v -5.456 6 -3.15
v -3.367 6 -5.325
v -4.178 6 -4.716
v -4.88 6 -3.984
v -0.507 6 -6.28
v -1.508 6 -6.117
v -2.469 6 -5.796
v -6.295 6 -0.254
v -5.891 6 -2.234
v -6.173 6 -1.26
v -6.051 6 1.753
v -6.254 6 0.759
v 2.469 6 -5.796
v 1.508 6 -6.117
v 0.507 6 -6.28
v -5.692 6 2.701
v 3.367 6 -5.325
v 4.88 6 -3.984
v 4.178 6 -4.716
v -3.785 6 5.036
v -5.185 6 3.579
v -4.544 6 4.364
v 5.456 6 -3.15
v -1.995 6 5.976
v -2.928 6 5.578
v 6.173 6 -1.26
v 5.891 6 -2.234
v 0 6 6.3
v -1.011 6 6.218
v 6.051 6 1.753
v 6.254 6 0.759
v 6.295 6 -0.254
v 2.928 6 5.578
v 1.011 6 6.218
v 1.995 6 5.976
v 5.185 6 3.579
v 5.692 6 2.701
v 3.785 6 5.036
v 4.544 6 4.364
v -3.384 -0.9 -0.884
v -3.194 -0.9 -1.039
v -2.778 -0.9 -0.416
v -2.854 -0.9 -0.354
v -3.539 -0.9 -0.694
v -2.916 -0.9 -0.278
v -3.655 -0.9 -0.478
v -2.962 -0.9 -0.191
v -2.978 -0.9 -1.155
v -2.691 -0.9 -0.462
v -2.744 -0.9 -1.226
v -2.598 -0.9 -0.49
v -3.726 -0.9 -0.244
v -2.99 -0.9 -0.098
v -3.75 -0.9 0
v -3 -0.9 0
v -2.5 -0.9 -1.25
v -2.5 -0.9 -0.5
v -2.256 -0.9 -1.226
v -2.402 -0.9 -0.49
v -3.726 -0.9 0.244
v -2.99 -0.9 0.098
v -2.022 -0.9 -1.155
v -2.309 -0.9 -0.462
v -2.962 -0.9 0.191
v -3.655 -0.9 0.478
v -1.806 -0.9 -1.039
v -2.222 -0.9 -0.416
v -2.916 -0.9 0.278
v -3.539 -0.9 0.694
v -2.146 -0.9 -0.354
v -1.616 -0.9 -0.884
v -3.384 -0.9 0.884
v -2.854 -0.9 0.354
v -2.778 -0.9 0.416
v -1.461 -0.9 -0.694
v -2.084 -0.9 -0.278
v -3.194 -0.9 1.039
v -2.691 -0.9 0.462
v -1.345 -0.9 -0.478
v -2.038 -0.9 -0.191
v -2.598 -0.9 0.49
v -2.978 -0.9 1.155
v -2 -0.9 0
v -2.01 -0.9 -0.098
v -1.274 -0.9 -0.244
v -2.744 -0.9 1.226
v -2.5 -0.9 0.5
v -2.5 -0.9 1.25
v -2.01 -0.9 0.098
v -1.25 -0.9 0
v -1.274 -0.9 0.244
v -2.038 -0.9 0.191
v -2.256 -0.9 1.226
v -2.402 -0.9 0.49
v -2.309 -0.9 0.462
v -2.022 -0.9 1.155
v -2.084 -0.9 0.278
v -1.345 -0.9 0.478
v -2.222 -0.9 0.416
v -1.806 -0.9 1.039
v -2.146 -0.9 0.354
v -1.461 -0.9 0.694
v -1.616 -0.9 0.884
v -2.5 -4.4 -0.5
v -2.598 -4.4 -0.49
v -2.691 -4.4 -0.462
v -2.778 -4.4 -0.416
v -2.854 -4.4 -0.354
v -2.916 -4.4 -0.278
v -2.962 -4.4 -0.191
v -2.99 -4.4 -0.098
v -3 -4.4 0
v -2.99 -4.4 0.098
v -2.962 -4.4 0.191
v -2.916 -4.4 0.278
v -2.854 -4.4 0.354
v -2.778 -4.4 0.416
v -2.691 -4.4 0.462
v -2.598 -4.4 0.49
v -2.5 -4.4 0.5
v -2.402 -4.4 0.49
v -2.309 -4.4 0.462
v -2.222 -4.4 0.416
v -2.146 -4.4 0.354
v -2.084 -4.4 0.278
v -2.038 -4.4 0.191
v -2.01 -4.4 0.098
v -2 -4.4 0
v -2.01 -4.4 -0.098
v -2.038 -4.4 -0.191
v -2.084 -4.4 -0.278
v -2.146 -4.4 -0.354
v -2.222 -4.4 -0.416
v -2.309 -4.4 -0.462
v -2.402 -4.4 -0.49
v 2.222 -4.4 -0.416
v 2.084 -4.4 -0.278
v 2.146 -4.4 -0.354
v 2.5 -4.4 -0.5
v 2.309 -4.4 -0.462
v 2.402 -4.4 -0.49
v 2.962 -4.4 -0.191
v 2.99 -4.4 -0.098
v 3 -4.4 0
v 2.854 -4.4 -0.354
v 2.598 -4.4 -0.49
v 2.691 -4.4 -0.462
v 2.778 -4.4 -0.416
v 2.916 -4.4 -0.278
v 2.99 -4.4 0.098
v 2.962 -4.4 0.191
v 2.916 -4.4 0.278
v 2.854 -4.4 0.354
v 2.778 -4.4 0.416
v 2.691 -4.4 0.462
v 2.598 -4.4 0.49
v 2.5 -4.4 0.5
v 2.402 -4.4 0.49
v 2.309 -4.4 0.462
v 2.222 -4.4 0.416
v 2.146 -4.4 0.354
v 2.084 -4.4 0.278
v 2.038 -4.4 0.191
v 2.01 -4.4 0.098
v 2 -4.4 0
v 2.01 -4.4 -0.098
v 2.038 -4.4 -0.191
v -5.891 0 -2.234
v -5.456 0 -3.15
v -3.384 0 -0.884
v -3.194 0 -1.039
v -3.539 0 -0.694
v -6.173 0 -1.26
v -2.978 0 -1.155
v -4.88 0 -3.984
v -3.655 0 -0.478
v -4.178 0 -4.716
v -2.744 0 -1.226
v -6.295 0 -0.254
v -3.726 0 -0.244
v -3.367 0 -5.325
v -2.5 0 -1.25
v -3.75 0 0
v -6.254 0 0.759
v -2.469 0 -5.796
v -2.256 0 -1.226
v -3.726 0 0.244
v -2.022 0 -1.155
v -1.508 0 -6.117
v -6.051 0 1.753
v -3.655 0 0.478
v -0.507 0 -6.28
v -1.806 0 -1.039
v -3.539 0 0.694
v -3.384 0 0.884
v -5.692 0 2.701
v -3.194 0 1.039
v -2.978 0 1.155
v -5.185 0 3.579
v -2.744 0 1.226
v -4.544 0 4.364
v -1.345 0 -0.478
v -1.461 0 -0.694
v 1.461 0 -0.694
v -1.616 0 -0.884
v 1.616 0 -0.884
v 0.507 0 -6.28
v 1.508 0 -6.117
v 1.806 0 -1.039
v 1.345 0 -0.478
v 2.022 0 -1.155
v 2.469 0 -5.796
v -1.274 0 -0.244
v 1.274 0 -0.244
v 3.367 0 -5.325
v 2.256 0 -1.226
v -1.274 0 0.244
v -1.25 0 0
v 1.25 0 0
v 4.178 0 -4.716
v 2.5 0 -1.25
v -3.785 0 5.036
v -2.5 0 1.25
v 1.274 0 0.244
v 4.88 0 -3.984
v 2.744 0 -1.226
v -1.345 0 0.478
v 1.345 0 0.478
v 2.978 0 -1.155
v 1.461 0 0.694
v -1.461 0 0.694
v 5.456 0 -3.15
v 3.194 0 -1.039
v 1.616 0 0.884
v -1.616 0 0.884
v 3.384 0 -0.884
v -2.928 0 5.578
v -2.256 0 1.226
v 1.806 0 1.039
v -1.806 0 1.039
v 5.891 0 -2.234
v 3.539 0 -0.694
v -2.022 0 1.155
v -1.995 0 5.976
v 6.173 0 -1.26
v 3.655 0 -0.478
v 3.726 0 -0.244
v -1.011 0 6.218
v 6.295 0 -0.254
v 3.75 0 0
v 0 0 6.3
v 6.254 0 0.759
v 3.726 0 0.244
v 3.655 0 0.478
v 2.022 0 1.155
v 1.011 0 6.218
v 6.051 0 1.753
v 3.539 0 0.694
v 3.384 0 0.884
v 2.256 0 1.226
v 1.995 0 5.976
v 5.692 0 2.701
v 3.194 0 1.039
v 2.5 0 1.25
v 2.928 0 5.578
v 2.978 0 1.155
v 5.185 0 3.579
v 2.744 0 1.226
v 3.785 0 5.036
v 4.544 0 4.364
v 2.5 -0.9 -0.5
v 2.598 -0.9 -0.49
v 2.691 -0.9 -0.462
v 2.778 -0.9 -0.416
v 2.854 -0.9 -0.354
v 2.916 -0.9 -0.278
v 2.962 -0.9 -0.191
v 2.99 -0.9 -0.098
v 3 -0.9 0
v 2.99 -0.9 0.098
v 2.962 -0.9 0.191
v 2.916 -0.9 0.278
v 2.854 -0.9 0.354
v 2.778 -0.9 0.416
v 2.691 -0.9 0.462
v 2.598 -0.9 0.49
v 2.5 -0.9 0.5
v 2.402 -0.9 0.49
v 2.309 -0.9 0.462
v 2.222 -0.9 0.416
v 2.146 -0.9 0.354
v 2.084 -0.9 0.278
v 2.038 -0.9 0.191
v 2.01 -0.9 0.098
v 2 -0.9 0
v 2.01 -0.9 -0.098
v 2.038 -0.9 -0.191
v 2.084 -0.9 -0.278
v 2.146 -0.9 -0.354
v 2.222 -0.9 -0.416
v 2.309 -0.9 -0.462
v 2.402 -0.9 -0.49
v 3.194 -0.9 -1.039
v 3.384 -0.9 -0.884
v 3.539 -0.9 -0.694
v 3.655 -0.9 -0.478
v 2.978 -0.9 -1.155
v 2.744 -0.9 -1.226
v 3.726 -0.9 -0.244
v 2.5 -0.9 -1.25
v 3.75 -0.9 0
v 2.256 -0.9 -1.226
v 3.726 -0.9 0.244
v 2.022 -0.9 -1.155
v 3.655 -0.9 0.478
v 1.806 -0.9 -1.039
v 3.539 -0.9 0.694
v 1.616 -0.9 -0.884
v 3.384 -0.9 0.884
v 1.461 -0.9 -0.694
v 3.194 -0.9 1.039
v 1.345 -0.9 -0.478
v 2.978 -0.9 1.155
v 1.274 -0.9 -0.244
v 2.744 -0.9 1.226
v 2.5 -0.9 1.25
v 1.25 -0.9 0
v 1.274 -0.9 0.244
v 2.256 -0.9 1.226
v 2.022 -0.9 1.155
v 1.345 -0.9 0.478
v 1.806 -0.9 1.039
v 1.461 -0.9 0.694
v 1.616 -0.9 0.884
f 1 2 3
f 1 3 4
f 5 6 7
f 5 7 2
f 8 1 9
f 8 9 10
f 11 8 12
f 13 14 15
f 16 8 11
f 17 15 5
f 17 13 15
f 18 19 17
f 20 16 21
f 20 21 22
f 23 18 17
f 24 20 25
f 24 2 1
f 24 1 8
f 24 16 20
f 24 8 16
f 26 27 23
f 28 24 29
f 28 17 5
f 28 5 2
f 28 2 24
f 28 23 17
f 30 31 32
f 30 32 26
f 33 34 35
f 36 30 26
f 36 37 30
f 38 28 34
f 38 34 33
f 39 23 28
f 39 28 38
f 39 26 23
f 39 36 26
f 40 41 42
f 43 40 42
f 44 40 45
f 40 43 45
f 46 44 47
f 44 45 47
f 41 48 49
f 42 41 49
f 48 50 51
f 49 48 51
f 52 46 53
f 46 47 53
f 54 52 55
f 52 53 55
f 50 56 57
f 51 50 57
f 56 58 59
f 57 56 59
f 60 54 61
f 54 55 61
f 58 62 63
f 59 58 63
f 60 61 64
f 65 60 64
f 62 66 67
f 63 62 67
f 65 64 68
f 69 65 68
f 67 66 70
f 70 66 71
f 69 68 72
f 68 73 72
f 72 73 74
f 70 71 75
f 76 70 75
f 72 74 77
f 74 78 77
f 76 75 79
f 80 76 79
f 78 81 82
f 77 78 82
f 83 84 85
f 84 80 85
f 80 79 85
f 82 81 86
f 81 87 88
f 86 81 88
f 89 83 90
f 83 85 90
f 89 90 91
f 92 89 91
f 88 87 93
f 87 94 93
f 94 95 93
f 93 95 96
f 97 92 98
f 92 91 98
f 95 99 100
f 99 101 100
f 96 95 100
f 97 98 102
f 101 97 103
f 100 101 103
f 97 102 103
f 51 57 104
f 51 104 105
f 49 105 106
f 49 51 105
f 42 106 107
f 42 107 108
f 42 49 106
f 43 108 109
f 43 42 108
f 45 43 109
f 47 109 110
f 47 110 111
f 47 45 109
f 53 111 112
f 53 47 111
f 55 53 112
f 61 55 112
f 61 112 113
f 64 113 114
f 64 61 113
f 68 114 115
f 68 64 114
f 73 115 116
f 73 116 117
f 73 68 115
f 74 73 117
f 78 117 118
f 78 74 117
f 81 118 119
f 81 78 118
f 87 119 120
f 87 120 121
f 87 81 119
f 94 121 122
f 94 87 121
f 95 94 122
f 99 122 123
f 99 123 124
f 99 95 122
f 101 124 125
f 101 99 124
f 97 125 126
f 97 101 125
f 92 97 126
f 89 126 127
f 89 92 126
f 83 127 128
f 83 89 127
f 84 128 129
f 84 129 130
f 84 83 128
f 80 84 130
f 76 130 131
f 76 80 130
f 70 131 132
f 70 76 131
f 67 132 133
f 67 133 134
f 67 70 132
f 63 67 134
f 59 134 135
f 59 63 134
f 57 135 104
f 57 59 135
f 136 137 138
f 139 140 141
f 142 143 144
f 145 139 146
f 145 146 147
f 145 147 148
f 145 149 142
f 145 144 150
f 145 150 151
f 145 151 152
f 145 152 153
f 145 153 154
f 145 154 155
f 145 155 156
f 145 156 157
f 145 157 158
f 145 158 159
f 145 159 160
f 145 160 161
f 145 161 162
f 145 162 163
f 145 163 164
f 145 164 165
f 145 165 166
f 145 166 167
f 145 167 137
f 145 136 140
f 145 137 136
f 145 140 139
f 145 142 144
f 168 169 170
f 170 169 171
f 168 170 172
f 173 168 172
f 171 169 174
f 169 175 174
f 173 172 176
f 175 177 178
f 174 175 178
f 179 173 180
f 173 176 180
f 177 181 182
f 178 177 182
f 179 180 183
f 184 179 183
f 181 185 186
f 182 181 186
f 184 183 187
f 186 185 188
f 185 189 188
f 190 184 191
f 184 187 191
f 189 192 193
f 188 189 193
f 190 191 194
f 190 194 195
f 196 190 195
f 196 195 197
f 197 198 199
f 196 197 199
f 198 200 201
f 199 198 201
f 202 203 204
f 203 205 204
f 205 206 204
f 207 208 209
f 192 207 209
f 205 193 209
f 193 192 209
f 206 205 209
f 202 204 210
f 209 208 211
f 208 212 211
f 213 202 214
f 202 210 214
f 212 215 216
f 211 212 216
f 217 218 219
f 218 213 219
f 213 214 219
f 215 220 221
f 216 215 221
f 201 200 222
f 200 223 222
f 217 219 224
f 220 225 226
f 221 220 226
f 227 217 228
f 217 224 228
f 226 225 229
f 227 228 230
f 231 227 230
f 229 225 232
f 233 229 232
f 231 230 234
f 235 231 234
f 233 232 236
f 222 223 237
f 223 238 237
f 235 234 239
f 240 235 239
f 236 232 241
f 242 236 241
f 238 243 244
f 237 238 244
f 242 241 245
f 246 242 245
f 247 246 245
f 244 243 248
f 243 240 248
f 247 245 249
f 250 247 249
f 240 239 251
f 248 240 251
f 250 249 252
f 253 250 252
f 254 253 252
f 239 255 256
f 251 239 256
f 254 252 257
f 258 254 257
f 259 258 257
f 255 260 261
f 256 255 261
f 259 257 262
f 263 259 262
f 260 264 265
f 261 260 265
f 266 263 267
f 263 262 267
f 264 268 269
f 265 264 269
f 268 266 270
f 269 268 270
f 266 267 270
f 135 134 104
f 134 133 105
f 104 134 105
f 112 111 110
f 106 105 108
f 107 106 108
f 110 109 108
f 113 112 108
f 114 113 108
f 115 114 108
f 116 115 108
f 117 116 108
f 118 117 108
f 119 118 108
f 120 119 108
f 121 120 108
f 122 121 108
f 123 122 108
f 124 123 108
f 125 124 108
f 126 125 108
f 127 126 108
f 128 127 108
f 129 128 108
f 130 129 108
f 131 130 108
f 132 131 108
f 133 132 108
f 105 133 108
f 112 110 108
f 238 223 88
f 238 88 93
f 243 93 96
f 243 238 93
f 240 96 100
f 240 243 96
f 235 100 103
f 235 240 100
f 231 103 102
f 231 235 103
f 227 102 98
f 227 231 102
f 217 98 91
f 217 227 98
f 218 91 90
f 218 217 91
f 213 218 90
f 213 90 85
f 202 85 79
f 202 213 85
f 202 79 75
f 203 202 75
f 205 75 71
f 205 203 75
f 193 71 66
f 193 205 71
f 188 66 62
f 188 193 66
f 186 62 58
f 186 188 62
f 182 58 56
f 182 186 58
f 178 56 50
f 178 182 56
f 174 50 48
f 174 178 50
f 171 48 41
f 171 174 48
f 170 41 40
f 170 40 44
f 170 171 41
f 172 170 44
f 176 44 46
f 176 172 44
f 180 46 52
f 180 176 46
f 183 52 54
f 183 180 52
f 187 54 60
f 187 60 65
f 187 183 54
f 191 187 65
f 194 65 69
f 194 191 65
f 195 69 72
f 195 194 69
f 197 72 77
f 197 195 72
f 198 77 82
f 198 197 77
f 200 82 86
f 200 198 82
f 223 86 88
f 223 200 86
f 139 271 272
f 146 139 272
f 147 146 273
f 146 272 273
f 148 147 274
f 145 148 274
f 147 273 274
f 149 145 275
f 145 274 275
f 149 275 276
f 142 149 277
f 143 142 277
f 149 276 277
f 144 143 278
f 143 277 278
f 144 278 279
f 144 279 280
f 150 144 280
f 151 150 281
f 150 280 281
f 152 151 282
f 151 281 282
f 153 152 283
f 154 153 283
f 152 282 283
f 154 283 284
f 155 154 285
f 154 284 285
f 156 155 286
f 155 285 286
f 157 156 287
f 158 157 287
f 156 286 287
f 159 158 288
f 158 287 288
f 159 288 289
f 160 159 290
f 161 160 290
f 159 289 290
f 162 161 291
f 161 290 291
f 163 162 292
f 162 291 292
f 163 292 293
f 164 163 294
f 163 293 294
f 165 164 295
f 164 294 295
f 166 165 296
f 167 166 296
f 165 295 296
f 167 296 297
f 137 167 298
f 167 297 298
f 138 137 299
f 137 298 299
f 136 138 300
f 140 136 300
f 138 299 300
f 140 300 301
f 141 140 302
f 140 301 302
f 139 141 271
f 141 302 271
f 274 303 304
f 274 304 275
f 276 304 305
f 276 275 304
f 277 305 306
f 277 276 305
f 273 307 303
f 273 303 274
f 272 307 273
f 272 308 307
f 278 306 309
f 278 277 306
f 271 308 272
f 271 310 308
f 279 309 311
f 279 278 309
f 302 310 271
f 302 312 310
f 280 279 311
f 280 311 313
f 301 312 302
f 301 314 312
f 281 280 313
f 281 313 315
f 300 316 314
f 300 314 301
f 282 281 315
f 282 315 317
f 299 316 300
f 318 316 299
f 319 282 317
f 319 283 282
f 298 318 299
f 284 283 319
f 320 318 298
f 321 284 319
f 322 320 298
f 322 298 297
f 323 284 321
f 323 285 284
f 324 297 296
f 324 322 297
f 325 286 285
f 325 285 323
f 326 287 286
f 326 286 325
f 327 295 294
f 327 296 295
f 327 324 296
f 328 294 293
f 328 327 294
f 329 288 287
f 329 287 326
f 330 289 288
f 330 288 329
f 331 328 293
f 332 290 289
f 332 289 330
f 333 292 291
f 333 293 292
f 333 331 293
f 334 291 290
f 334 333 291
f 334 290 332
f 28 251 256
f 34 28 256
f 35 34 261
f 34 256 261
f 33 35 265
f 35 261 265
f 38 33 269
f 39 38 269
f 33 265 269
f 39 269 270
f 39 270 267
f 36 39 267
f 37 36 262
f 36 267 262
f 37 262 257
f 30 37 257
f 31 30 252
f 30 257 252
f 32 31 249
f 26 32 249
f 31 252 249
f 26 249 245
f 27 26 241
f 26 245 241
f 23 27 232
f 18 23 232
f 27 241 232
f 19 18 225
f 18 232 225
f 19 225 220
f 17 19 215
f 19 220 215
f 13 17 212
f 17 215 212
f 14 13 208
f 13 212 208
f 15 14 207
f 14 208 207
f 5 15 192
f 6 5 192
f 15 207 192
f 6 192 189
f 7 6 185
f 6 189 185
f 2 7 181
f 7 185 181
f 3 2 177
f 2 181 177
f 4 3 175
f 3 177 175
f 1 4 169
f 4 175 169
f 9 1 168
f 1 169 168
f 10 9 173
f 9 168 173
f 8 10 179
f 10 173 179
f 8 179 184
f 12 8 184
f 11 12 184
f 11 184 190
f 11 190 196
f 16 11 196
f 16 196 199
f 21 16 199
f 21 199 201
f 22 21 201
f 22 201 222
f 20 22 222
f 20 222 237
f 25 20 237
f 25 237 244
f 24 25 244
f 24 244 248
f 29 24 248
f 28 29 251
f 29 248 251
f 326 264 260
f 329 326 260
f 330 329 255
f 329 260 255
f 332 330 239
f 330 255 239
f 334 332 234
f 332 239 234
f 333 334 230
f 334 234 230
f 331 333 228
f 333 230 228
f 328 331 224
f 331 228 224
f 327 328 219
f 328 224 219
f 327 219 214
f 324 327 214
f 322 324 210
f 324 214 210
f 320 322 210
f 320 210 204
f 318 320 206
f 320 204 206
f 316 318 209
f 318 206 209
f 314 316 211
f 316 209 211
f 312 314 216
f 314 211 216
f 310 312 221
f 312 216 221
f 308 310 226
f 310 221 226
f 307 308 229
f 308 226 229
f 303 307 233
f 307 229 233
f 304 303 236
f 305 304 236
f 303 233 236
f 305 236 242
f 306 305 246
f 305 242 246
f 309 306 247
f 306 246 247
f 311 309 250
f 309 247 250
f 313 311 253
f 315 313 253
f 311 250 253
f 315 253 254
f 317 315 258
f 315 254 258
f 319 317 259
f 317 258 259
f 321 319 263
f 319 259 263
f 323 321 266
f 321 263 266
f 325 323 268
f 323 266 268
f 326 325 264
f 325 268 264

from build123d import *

# Parameters (mm, degrees)
SKETCH1_R           = 6.3
BOSS_EXTRUDE1_DEPTH = 6
SKETCH2_R           = 1.25
BOSS_EXTRUDE2_DEPTH = 0.9
SKETCH3_R           = 0.5
BOSS_EXTRUDE3_DEPTH = 3.5


with BuildPart() as part:
    # Sketch1 → Boss-Extrude1 (new body)
    with BuildSketch(Plane(origin=(0, 0, 0), x_dir=(1, 0, 0), z_dir=(0, 1, 0))):
        with Locations(Location((0, 0, 0), (0, 0, 270))):
            Circle(SKETCH1_R)
    extrude(amount=BOSS_EXTRUDE1_DEPTH)

    # Sketch2 → Boss-Extrude2 (add)
    with BuildSketch(Plane.XZ):
        with Locations(Location((2.5, 0, 0), (0, 0, 90))):
            Circle(SKETCH2_R)
    boss_extrude2 = extrude(amount=BOSS_EXTRUDE2_DEPTH)

    # Sketch3 → Boss-Extrude3 (add)
    with BuildSketch(Plane.XZ.offset(0.9)):
        with Locations(Location((2.5, 0, 0), (0, 0, 270))):
            Circle(SKETCH3_R)
    boss_extrude3 = extrude(amount=BOSS_EXTRUDE3_DEPTH)

    # Mirror1: Boss-Extrude2, Boss-Extrude3 across plane
    add(boss_extrude2.mirror(Plane(origin=(0, 0, 0), x_dir=(0, 0, 1), z_dir=(1, 0, 0))))
    add(boss_extrude3.mirror(Plane(origin=(0, 0, 0), x_dir=(0, 0, 1), z_dir=(1, 0, 0))))


solid = part.part
